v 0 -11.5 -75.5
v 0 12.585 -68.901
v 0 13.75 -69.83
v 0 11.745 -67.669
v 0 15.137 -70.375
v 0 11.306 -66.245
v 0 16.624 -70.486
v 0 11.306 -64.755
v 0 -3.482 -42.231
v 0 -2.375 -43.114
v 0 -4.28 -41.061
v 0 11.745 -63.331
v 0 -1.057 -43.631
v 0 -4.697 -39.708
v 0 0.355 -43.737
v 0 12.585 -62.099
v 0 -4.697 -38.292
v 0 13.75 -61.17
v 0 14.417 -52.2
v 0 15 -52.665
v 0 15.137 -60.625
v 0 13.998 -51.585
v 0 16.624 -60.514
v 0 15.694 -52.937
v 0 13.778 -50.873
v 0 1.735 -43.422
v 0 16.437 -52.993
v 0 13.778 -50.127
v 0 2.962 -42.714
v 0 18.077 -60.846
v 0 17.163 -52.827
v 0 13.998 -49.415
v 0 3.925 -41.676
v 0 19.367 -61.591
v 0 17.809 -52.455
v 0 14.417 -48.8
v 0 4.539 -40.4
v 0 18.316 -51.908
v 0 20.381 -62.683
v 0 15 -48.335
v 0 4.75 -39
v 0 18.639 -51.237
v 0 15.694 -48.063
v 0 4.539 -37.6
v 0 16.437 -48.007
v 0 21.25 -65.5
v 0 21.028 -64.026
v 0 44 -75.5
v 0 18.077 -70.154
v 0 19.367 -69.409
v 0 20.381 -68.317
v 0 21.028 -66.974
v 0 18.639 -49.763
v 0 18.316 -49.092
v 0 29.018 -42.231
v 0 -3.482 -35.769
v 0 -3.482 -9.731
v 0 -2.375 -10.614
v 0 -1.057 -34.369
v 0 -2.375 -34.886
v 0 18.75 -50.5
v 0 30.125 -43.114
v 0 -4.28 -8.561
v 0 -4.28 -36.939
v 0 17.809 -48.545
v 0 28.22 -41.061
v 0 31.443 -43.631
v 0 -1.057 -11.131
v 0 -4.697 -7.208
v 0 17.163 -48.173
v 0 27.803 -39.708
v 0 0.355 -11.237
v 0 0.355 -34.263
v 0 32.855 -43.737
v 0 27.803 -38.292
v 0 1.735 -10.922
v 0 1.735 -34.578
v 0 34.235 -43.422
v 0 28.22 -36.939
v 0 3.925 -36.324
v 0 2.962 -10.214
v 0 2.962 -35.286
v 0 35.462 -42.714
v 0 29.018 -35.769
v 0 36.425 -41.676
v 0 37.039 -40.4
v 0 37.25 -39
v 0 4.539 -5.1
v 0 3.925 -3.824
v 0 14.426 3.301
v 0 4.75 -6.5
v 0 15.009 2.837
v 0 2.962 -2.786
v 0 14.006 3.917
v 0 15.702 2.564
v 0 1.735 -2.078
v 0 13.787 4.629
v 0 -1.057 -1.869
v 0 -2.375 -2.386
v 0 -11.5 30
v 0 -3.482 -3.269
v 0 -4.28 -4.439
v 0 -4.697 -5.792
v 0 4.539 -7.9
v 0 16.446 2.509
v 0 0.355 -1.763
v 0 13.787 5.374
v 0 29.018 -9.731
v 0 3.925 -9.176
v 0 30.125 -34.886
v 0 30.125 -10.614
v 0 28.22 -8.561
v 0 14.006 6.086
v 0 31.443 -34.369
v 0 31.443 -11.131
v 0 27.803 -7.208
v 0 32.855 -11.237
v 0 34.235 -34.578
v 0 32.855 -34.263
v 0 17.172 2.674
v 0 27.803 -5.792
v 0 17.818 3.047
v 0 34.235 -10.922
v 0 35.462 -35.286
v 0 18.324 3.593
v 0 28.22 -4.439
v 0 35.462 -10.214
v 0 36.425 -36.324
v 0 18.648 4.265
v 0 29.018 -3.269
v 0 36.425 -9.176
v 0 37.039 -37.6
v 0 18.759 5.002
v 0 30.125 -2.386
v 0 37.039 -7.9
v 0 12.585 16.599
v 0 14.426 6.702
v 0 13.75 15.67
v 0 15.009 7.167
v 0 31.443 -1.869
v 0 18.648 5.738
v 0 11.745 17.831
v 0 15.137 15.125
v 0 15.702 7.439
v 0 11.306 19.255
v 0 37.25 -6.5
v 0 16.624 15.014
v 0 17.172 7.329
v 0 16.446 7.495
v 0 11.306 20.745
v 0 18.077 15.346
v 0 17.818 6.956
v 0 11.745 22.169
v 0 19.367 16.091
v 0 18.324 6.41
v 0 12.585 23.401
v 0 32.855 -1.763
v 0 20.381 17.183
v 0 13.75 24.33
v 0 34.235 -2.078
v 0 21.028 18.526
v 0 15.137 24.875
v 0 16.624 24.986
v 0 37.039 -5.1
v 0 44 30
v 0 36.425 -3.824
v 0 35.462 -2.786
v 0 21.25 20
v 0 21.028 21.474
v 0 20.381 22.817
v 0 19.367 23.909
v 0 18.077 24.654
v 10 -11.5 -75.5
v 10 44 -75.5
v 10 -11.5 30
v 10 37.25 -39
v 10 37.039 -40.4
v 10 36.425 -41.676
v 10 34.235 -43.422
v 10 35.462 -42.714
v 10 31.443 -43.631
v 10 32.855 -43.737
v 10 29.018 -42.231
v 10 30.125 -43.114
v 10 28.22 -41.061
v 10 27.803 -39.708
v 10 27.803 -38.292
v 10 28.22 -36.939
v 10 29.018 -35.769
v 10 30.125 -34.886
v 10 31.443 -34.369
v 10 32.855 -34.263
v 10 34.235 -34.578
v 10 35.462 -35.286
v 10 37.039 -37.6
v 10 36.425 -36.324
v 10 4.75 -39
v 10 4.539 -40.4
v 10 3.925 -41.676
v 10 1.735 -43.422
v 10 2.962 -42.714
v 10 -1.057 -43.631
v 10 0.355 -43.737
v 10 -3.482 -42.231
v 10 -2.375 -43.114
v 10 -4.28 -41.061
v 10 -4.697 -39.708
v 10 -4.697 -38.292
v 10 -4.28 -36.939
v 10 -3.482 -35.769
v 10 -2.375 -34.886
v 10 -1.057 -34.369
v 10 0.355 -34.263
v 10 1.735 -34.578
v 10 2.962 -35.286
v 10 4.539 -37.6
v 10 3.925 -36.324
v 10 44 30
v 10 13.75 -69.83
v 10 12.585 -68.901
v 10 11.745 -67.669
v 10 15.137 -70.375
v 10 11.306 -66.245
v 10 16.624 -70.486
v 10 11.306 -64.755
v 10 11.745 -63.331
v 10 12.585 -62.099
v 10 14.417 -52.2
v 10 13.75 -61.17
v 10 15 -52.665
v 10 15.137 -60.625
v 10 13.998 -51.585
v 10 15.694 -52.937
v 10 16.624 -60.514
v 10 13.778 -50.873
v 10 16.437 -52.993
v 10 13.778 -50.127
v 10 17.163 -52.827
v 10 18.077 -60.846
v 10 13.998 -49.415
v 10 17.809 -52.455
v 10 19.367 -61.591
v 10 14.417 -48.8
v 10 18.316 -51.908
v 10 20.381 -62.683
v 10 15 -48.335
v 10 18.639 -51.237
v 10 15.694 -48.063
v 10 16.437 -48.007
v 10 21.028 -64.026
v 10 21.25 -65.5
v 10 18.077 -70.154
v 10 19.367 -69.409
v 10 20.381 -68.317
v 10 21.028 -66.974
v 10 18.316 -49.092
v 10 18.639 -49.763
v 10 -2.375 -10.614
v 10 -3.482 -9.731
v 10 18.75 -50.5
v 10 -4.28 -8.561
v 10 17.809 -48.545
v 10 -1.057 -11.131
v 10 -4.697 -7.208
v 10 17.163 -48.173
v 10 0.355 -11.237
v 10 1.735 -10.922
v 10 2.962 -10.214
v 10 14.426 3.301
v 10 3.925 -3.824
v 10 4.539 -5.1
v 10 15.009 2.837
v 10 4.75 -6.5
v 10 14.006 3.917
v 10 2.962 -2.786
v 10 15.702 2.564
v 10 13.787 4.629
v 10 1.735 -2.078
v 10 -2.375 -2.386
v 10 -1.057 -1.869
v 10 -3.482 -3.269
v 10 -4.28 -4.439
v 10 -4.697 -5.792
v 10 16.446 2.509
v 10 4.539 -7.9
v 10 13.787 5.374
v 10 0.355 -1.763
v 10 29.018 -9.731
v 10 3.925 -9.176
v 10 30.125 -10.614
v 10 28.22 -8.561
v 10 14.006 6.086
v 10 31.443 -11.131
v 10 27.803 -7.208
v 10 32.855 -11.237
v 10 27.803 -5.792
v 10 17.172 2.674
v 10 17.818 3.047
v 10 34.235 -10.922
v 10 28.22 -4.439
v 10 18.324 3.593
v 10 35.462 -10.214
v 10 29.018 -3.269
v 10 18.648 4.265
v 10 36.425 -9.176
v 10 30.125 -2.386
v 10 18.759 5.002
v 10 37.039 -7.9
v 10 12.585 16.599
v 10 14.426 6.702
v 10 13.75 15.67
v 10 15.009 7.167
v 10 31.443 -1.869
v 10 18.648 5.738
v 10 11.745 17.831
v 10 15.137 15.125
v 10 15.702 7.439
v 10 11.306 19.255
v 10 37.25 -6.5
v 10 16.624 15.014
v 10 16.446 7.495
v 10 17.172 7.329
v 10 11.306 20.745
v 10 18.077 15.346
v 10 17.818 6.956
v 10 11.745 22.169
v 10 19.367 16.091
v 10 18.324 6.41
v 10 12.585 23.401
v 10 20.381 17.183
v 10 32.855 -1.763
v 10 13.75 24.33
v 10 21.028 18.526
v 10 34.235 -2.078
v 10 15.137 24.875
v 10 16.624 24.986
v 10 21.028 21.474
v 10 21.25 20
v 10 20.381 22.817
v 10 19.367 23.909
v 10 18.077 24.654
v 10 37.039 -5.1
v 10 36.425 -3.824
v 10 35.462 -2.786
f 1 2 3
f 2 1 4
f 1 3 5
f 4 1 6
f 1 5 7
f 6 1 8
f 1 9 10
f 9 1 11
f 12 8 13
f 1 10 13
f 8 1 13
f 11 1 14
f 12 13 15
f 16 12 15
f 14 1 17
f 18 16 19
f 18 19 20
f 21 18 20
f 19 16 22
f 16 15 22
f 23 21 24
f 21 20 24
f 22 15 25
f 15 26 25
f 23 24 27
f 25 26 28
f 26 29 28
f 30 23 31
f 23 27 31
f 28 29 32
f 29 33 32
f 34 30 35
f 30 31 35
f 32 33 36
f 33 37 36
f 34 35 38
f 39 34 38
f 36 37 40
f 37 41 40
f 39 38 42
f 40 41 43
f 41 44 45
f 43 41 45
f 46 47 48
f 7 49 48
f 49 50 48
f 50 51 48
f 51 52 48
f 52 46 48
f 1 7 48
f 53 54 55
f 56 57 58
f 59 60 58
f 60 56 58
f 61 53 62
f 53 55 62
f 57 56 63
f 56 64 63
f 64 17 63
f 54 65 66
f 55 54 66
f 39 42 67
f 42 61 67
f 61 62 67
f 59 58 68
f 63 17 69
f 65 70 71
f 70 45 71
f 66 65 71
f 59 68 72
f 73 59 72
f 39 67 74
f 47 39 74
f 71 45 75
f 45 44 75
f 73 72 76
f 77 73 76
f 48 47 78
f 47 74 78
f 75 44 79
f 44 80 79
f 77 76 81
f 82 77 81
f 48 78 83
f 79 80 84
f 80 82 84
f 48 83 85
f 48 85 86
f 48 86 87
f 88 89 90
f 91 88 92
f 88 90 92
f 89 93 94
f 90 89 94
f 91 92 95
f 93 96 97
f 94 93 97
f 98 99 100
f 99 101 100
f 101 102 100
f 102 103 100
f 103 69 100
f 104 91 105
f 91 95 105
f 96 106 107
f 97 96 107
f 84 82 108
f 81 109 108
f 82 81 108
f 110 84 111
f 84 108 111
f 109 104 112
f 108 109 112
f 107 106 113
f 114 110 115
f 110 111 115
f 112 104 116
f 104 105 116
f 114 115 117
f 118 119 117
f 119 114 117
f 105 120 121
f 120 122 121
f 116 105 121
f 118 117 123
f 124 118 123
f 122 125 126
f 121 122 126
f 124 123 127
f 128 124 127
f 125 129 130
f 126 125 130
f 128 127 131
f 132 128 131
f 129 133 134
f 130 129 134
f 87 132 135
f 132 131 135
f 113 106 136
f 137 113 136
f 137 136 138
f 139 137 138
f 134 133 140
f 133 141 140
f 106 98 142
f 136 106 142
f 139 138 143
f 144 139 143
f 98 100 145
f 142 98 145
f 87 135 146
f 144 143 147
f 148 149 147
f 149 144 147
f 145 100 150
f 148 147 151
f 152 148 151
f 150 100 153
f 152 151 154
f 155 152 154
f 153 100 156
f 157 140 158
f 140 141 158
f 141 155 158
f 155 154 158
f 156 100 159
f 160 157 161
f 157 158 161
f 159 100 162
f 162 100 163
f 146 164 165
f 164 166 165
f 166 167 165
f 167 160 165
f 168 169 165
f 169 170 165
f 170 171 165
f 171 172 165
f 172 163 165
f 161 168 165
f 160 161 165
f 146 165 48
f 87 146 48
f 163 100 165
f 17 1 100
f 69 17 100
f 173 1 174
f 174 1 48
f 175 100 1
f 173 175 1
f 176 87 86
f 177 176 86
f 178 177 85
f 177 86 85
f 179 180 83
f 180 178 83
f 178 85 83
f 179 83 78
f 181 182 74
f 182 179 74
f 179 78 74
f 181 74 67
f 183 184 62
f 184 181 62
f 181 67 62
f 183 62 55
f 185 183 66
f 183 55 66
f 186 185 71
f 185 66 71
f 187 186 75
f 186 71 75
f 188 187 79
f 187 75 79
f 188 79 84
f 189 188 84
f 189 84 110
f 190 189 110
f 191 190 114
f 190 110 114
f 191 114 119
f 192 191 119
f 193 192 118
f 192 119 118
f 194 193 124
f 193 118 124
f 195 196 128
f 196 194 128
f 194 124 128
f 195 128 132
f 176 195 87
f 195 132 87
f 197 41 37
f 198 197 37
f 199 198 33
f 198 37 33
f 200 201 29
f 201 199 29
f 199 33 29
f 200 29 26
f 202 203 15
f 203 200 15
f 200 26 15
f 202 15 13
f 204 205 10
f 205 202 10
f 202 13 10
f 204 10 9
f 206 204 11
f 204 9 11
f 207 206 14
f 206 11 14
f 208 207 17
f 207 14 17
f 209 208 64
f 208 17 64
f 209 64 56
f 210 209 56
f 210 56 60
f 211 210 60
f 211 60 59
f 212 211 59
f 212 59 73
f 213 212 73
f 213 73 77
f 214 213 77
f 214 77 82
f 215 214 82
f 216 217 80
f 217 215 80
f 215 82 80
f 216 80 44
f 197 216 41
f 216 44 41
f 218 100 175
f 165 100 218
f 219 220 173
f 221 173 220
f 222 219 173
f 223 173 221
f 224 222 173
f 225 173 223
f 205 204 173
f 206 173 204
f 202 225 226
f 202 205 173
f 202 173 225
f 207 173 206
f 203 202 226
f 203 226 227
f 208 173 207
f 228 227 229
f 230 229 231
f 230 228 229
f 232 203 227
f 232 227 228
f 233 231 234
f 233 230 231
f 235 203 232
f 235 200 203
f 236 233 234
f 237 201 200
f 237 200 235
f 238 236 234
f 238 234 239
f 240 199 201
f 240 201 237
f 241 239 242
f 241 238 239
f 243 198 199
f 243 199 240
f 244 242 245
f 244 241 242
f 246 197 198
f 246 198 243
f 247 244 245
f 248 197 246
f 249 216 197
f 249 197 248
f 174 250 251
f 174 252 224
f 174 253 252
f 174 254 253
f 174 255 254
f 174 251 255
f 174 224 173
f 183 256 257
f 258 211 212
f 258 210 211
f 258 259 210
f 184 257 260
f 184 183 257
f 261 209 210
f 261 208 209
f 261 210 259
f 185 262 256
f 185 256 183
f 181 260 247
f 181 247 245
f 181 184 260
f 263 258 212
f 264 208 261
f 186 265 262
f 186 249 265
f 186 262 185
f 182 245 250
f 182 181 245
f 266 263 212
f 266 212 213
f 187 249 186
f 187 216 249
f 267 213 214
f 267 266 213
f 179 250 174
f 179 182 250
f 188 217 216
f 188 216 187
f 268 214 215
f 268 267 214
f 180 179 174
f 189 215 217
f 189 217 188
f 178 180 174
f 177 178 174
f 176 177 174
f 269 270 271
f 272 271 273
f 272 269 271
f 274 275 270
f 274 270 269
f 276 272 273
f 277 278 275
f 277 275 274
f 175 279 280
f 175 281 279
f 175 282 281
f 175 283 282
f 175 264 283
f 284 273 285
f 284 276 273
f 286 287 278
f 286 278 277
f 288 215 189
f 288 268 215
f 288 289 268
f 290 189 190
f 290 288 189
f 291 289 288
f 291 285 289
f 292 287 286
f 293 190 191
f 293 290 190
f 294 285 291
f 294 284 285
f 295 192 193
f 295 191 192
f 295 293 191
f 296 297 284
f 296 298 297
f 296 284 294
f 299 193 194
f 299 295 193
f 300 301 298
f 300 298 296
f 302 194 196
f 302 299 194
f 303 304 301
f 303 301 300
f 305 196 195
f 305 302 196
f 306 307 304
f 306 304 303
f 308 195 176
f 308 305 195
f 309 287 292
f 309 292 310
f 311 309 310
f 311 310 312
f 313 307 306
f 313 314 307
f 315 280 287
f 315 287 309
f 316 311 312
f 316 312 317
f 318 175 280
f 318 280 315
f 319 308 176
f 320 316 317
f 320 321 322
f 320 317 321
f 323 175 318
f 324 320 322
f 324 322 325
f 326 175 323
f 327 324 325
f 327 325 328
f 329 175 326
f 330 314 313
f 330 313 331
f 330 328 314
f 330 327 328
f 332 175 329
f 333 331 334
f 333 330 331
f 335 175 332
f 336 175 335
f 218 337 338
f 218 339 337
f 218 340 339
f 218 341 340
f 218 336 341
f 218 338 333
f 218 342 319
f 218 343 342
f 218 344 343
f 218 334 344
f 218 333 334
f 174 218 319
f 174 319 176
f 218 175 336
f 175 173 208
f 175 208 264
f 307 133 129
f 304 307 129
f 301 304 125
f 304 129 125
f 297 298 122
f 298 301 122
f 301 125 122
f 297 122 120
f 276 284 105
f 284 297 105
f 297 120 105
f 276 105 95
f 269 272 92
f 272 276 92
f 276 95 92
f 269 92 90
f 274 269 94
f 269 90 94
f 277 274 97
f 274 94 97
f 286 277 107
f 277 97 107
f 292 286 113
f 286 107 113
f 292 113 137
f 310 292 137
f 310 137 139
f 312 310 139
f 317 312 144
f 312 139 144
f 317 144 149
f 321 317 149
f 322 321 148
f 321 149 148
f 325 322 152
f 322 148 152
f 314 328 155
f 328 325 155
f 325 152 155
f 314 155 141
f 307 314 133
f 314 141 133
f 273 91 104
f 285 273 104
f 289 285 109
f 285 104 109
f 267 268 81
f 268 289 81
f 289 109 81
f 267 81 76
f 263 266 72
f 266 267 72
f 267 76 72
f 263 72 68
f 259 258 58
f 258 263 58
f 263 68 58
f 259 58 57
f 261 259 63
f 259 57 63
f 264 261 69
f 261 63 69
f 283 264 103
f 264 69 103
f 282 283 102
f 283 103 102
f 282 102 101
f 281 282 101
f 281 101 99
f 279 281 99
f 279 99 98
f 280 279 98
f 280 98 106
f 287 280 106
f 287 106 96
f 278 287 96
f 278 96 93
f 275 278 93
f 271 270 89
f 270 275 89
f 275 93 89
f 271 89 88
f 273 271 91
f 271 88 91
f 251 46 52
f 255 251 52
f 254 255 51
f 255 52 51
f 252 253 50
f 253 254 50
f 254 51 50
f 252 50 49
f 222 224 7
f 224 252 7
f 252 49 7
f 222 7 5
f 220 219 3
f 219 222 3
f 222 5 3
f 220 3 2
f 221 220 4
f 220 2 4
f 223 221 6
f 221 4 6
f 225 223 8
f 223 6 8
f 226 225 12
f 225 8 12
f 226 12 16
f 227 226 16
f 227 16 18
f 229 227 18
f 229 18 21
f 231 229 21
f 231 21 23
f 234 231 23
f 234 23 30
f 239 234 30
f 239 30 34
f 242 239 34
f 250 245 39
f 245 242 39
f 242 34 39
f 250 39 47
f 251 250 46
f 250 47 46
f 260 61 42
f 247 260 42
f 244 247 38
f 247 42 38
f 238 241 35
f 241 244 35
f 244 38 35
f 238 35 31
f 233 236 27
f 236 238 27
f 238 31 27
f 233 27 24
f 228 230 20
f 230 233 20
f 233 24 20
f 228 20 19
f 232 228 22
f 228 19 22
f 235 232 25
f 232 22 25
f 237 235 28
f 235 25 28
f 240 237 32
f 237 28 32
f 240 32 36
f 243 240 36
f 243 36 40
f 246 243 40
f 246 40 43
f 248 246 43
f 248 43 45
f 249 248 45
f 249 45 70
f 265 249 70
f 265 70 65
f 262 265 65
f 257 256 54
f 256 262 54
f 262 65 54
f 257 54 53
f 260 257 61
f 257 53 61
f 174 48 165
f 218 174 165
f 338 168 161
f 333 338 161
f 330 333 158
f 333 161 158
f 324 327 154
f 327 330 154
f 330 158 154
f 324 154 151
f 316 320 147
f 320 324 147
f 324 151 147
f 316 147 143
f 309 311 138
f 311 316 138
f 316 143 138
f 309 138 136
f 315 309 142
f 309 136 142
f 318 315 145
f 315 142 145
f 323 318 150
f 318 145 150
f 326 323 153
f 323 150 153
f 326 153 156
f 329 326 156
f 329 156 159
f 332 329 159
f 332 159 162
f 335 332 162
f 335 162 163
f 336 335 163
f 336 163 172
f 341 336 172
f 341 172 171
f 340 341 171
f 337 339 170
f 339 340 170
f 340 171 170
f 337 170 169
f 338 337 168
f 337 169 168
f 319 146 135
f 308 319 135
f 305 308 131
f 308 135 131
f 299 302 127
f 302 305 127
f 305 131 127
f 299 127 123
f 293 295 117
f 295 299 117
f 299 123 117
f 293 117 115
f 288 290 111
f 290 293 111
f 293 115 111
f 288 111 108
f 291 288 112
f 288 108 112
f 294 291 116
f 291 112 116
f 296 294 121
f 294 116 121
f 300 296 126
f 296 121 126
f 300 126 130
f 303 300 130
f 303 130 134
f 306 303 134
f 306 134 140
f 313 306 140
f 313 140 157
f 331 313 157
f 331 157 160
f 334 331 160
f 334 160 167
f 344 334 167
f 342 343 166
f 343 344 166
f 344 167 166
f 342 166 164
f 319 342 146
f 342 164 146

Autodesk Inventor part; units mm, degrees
ref_plane "YZ Plane" through (0, 0, 0) normal (1, 0, 0) x (0, 1, 0)
ref_plane "XZ Plane" through (0, 0, 0) normal (0, 1, 0) x (-1, 0, 0)
ref_plane "XY Plane" through (0, 0, 0) normal (0, 0, 1) x (1, 0, 0)
sketch "Sketch1" plane through (0, 0, 0) normal (1, 0, 0) x (0, 1, 0)
  line L0 (-6, -12.5) -> (-6, -12.9)
  arc A0 (-6, -12.9) -> (-5.6, -13.3) centre (-5.6, -12.9) ccw
  line L1 (-5.6, -13.3) -> (-4.9, -13.3)
  arc A1 (-4.9, -13.3) -> (-4.7, -13.1) centre (-4.9, -13.1) ccw
  line L2 (-4.7, -13.1) -> (-4.7, -12.85)
  arc A2 (-4.5, -12.65) -> (-4.7, -12.85) centre (-4.5, -12.85) ccw
  line L3 (-4.5, -12.65) -> (-1.8, -12.65)
  arc A3 (-1.4, -13.05) -> (-1.8, -12.65) centre (-1.8, -13.05) ccw
  line L4 (-1.4, -13.05) -> (-1.4, -18.75)
  line L5 (-1.8, -19.15) -> (-4.5, -19.15)
  arc A4 (-1.8, -19.15) -> (-1.4, -18.75) centre (-1.8, -18.75) ccw
  arc A5 (-4.7, -18.95) -> (-4.5, -19.15) centre (-4.5, -18.95) ccw
  line L6 (-4.7, -18.95) -> (-4.7, -18.7)
  arc A6 (-4.7, -18.7) -> (-4.9, -18.5) centre (-4.9, -18.7) ccw
  line L7 (-4.9, -18.5) -> (-5.6, -18.5)
  arc A7 (-5.6, -18.5) -> (-6, -18.9) centre (-5.6, -18.9) ccw
  line L8 (-6, -18.9) -> (-6, -19.5)
  line L9 (-6.5, -6.5) -> (-6.5, -12.5)
  line L10 (-6.5, -12.5) -> (-2.5, -12.5)
  line L11 (-1.05, -19.5) -> (-6.5, -19.5)
  line L12 (-6.5, -19.5) -> (-6.5, -26)
  line L13 (-6.5, -26) -> (-1.05, -26)
  line L14 (-6, -26) -> (-6, -26.6)
  arc A8 (-6, -26.6) -> (-5.6, -27) centre (-5.6, -26.6) ccw
  line L15 (-5.6, -27) -> (-4.9, -27)
  arc A9 (-4.9, -27) -> (-4.7, -26.8) centre (-4.9, -26.8) ccw
  arc A10 (-4.5, -26.35) -> (-4.7, -26.55) centre (-4.5, -26.55) ccw
  line L16 (-4.7, -26.8) -> (-4.7, -26.55)
  line L17 (-4.5, -26.35) -> (-1.8, -26.35)
  arc A11 (-1.4, -26.75) -> (-1.8, -26.35) centre (-1.8, -26.75) ccw
  line L18 (-1.4, -26.75) -> (-1.4, -32.45)
  arc A12 (-1.8, -32.85) -> (-1.4, -32.45) centre (-1.8, -32.45) ccw
  line L19 (-1.8, -32.85) -> (-4.5, -32.85)
  arc A13 (-4.7, -32.65) -> (-4.5, -32.85) centre (-4.5, -32.65) ccw
  line L20 (-4.7, -32.65) -> (-4.7, -32.4)
  arc A14 (-4.7, -32.4) -> (-4.9, -32.2) centre (-4.9, -32.4) ccw
  line L21 (-4.9, -32.2) -> (-5.6, -32.2)
  arc A15 (-5.6, -32.2) -> (-6, -32.6) centre (-5.6, -32.6) ccw
  line L22 (-6, -32.6) -> (-6, -33)
  line L23 (-2.5, -33) -> (-6.5, -33)
  line L24 (-6.5, -33) -> (-6.5, -39)
  line L25 (32.5, 0) -> (0, 0)
  circle A16 centre (0, -6.5) radius 4.75
  circle A17 centre (32.5, -6.5) radius 4.75
  circle A18 centre (0, -39) radius 4.75
  circle A19 centre (32.5, -39) radius 4.75
  line L26 (39, -26) -> (39, -19.5)
  line L27 (39, -12.5) -> (39, -6.5)
  line L28 (39, -39) -> (39, -33)
  line L29 (26.5, -45.5) -> (32.5, -45.5)
  line L30 (0, -45.5) -> (6, -45.5)
  line L31 (13, -45.5) -> (19.5, -45.5)
  circle A20 centre (16.2588, 5.0016) radius 2.5
  circle A21 centre (16.25, -50.5) radius 2.5
  line L32 (44, 10) -> (-11.5, 10)
  line L33 (-11.5, 10) -> (-11.5, -55.5)
  line L34 (-11.5, -55.5) -> (44, -55.5)
  line L35 (44, -55.5) -> (44, 10)
  line L36 (44, 10) -> (-11.5, 10)
  line L37 (-11.5, 10) -> (-11.5, 30)
  line L38 (-11.5, 30) -> (44, 30)
  line L39 (44, 30) -> (44, 10)
  line L40 (44, -55.5) -> (-11.5, -55.5)
  line L41 (-11.5, -55.5) -> (-11.5, -75.5)
  line L42 (-11.5, -75.5) -> (44, -75.5)
  line L43 (44, -75.5) -> (44, -55.5)
  circle A22 centre (16.25, 20) radius 5
  circle A23 centre (16.25, -65.5) radius 5
  point P0 (24.75, -17.8425)
  point P1 (-11.5, 10)
  dimension "d0" = 20
  dimension "d1" = 20
  dimension "d2" = 10
  dimension "d3" = 10
extrude "Extrusion1" add sketch "Sketch1" along normal blind 10
properties part number "PlacaMediaHidráulicos_CPY"
